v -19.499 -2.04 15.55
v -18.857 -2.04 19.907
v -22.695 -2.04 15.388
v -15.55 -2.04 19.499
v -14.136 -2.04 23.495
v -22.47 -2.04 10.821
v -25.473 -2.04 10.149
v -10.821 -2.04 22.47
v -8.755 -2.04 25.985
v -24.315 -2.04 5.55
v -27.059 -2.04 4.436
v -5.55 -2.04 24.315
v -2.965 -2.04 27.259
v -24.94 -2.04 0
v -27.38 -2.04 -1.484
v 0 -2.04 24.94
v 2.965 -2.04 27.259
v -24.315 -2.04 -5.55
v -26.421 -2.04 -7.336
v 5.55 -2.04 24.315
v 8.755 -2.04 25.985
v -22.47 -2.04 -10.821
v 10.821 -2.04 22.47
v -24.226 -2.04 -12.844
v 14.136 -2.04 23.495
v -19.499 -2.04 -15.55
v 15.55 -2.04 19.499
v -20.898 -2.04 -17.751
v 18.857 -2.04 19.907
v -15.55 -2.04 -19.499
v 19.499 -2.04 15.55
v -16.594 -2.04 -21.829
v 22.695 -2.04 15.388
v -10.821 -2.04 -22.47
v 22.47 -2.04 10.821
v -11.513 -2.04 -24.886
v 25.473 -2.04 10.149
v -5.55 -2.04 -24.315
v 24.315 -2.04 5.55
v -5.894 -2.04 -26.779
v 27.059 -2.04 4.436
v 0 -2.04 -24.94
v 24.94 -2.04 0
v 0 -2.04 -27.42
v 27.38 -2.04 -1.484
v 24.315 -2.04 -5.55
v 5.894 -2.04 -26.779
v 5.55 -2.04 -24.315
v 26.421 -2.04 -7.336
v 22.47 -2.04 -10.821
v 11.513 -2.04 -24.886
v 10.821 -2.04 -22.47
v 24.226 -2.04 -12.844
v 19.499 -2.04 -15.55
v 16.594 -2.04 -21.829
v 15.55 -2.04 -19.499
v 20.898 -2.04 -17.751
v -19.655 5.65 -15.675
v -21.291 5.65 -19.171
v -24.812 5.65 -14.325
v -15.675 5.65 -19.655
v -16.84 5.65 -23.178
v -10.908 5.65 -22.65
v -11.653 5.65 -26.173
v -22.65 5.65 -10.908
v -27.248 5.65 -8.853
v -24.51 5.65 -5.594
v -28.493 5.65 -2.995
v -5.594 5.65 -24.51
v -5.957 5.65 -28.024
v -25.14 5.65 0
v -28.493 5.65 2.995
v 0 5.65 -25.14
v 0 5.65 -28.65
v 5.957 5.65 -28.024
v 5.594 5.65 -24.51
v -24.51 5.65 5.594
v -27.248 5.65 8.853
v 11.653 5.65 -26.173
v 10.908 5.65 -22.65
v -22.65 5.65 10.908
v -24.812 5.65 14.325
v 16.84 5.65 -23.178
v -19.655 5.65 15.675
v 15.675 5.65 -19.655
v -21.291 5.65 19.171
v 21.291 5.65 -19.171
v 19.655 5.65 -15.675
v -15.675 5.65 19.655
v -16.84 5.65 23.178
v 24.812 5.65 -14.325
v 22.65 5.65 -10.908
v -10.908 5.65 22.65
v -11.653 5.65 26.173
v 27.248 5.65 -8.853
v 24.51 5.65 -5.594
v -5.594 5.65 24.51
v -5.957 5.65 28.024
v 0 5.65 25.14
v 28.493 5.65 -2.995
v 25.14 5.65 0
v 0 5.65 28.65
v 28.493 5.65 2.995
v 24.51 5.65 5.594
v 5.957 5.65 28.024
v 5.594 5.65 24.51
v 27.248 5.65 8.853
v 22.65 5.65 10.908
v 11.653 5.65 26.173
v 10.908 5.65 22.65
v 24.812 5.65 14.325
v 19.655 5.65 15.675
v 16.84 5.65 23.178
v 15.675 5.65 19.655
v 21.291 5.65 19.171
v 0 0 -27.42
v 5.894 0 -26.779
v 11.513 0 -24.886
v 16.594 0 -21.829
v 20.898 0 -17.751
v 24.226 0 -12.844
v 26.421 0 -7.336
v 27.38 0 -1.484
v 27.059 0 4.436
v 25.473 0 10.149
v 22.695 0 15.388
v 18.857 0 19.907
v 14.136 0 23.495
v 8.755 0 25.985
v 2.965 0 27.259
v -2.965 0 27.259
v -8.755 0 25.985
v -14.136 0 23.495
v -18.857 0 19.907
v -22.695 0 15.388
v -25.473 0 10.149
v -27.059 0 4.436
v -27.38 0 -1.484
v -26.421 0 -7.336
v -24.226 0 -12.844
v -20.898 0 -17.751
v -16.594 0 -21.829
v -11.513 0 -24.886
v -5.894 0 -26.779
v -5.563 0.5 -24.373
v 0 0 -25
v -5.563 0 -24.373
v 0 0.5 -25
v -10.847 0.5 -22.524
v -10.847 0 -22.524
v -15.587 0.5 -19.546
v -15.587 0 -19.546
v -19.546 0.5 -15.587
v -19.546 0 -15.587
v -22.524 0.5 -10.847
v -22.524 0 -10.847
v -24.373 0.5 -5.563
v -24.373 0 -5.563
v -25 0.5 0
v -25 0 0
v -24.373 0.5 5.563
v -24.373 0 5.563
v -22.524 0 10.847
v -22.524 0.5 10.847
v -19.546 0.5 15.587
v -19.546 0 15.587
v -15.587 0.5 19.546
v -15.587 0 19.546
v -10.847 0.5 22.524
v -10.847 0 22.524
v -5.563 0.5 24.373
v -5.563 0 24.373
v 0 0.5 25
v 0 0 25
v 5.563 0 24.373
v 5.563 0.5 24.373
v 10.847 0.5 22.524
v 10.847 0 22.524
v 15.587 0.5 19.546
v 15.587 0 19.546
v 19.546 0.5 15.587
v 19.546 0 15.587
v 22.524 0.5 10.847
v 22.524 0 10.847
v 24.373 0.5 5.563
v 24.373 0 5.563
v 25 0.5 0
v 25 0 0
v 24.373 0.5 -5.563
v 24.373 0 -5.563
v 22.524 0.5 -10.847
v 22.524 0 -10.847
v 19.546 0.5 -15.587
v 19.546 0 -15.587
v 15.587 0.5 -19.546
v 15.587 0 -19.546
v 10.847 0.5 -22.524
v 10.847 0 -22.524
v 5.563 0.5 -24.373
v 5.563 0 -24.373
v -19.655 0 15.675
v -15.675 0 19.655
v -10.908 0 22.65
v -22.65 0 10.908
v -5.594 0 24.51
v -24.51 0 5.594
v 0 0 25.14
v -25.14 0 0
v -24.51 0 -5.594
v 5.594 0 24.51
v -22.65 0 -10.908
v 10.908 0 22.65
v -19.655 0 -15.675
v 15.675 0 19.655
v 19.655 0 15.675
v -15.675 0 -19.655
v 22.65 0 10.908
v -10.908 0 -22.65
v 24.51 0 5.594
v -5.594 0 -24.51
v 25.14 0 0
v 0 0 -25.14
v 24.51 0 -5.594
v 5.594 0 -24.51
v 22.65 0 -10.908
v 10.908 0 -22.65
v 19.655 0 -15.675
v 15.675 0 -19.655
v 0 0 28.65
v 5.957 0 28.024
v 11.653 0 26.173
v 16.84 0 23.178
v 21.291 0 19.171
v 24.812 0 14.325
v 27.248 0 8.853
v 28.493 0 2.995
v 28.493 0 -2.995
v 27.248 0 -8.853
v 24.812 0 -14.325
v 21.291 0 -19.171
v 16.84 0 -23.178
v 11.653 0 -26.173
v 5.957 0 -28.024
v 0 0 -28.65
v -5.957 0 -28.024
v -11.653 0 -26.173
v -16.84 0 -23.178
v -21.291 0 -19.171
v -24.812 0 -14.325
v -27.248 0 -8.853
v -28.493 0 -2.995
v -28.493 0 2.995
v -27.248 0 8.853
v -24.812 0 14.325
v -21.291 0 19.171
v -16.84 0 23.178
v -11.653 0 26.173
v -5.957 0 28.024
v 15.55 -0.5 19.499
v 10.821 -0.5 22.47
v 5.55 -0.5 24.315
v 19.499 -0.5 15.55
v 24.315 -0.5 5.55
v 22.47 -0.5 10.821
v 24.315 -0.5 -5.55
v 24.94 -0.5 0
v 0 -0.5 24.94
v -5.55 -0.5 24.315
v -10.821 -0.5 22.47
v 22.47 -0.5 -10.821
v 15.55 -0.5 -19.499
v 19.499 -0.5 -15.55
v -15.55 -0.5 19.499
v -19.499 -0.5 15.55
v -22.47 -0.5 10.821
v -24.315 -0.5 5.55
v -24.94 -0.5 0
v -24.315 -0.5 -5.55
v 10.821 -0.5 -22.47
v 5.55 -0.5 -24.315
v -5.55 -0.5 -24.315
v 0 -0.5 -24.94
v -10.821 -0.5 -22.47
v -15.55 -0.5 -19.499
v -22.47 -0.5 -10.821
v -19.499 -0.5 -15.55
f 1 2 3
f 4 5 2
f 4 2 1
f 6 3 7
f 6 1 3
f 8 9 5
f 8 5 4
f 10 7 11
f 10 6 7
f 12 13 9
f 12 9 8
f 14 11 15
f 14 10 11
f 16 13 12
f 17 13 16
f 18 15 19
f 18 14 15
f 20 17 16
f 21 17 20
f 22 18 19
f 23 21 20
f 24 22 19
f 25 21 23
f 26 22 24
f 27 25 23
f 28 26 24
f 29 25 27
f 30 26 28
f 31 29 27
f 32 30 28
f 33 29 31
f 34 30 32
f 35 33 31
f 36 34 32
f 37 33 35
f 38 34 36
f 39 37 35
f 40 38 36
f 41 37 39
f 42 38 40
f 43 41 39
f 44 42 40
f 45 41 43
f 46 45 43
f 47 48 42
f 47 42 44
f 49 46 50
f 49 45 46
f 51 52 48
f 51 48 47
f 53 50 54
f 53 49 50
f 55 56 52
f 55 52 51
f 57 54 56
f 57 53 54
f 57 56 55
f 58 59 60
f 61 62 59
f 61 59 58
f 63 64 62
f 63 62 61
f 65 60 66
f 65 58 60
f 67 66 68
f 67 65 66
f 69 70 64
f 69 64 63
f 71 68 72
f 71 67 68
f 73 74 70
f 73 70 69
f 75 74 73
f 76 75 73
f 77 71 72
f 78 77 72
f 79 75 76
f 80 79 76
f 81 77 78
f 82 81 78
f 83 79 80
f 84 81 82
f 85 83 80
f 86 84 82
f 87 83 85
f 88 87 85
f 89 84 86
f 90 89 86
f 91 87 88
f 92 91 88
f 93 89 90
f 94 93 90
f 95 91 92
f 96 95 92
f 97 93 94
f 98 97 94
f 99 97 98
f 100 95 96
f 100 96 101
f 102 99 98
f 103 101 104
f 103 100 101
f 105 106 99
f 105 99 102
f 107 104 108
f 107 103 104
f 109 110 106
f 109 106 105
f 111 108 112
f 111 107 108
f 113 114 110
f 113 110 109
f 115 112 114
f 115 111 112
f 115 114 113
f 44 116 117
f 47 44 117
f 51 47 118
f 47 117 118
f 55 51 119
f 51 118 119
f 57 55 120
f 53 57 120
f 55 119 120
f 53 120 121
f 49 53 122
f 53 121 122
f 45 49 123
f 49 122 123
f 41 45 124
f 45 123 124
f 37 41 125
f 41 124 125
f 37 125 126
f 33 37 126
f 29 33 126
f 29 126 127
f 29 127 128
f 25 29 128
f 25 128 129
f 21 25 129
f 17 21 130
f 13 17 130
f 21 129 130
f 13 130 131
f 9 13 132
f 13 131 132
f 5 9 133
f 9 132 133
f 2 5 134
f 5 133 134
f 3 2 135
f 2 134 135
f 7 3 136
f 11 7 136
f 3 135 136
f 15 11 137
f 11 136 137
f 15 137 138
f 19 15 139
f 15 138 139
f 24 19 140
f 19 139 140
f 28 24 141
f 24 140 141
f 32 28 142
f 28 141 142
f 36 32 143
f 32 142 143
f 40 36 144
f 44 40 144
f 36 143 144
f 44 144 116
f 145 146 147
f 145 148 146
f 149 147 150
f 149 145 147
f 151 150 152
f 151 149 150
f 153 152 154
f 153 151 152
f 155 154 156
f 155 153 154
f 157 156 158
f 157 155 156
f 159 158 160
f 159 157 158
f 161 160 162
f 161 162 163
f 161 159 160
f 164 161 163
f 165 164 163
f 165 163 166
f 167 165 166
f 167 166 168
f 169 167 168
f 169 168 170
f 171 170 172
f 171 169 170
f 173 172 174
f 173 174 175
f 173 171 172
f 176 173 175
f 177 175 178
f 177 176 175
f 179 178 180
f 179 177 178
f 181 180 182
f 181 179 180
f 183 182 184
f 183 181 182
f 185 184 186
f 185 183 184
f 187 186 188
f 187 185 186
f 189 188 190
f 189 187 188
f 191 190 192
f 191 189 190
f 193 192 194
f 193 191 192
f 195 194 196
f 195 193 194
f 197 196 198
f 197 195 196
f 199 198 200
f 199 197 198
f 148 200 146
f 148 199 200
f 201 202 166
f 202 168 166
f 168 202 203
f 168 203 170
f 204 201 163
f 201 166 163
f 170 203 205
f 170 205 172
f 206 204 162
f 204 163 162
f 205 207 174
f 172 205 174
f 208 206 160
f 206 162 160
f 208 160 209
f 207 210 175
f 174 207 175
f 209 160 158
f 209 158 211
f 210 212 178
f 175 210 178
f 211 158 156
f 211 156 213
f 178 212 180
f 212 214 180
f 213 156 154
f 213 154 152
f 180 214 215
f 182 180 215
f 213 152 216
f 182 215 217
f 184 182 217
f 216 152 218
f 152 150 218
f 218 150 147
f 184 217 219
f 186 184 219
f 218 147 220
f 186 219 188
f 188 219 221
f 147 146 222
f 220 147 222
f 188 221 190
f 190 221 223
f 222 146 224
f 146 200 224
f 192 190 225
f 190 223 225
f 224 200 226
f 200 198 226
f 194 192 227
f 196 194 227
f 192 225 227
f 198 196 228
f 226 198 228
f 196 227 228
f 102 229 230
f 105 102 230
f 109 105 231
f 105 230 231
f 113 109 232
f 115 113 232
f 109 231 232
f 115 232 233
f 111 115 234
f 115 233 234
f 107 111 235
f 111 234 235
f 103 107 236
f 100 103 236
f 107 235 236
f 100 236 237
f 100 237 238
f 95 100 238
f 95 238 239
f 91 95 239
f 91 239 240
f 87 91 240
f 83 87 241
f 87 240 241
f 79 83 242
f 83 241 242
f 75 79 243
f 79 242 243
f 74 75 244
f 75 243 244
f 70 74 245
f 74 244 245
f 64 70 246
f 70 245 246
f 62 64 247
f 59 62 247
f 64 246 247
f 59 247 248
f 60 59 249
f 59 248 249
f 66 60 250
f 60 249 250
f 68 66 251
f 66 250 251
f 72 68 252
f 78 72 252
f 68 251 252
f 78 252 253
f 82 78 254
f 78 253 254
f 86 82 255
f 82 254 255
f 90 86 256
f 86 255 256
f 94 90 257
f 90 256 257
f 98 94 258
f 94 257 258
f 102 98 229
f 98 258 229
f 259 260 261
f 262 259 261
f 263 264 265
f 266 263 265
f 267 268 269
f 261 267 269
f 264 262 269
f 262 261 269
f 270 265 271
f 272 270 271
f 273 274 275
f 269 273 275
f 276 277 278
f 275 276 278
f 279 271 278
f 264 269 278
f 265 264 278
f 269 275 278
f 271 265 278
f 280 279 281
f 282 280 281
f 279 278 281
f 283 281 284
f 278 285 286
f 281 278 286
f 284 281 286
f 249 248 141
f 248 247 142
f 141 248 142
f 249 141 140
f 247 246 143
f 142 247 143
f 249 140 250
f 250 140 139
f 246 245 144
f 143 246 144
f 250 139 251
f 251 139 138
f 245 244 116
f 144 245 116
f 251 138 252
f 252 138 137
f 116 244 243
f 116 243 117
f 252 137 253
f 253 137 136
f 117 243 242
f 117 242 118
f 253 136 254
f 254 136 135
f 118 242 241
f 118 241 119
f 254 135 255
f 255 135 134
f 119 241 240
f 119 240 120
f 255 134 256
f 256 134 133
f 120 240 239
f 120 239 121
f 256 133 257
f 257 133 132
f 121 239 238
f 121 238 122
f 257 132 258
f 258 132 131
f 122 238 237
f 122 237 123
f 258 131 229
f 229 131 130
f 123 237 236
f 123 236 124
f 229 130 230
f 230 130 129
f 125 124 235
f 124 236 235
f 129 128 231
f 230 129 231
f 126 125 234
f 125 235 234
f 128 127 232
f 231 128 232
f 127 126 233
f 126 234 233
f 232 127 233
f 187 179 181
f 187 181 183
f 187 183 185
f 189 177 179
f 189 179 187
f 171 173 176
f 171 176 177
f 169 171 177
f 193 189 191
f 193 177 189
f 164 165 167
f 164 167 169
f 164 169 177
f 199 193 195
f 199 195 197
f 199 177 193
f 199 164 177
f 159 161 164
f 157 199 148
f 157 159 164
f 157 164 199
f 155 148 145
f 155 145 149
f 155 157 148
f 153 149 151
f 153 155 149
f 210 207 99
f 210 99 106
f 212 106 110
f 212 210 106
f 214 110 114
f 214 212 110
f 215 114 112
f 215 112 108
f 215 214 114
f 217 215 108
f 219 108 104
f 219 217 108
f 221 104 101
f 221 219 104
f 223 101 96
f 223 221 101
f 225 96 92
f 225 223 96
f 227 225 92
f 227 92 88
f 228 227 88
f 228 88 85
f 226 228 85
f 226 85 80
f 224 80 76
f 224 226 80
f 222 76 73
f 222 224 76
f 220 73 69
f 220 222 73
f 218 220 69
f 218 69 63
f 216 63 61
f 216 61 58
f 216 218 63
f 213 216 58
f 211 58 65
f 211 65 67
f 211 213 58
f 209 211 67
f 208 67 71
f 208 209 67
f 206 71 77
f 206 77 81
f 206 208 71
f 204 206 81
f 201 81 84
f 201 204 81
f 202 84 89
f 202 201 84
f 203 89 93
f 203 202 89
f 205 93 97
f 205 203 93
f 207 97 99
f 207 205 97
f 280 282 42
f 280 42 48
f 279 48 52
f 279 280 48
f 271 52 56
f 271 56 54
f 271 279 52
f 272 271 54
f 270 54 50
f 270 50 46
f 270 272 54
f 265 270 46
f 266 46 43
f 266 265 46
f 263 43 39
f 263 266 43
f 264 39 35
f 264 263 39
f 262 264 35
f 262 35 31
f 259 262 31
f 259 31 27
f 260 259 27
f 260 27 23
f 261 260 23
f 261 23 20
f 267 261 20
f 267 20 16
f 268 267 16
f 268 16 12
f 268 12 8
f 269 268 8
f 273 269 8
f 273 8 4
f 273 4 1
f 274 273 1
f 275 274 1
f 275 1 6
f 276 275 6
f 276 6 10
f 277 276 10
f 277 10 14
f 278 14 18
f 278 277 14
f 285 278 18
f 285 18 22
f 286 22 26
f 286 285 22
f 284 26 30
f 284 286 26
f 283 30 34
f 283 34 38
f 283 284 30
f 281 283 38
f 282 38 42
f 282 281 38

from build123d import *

# Parameters (mm, degrees)
SKETCH_1_R      = 28.65
SKETCH_1_R_2    = 25.14
EXTRUDE_1_DEPTH = 5.65
SKETCH_2_R      = 27.42
SKETCH_2_R_2    = 24.94
EXTRUDE_2_DEPTH = 2.04
SKETCH_3_R      = 25
EXTRUDE_3_DEPTH = 0.5


with BuildPart() as part:
    # Эскиз1 → Бобышка-Вытянуть1 (new body)
    with BuildSketch(Plane(origin=(0, 0, 0), x_dir=(1, 0, 0), z_dir=(0, 1, 0))):
        with Locations(Location((0, 0, 0), (0, 0, 270))):
            Circle(SKETCH_1_R)
        with Locations(Location((0, 0, 0), (0, 0, 270))):
            Circle(SKETCH_1_R_2, mode=Mode.SUBTRACT)
    extrude(amount=EXTRUDE_1_DEPTH)

    # Эскиз2 → Бобышка-Вытянуть2 (add)
    with BuildSketch(Plane.XZ):
        with Locations(Location((0, 0, 0), (0, 0, 270))):
            Circle(SKETCH_2_R)
        with Locations(Location((0, 0, 0), (0, 0, 270))):
            Circle(SKETCH_2_R_2, mode=Mode.SUBTRACT)
    extrude(amount=EXTRUDE_2_DEPTH)

    # Эскиз3 → Бобышка-Вытянуть3 (add, symmetric)
    with BuildSketch(Plane(origin=(0, 0, 0), x_dir=(1, 0, 0), z_dir=(0, 1, 0))):
        with Locations(Location((0, 0, 0), (0, 0, 90))):
            Circle(SKETCH_3_R)
    extrude(amount=EXTRUDE_3_DEPTH, both=True)


solid = part.part
